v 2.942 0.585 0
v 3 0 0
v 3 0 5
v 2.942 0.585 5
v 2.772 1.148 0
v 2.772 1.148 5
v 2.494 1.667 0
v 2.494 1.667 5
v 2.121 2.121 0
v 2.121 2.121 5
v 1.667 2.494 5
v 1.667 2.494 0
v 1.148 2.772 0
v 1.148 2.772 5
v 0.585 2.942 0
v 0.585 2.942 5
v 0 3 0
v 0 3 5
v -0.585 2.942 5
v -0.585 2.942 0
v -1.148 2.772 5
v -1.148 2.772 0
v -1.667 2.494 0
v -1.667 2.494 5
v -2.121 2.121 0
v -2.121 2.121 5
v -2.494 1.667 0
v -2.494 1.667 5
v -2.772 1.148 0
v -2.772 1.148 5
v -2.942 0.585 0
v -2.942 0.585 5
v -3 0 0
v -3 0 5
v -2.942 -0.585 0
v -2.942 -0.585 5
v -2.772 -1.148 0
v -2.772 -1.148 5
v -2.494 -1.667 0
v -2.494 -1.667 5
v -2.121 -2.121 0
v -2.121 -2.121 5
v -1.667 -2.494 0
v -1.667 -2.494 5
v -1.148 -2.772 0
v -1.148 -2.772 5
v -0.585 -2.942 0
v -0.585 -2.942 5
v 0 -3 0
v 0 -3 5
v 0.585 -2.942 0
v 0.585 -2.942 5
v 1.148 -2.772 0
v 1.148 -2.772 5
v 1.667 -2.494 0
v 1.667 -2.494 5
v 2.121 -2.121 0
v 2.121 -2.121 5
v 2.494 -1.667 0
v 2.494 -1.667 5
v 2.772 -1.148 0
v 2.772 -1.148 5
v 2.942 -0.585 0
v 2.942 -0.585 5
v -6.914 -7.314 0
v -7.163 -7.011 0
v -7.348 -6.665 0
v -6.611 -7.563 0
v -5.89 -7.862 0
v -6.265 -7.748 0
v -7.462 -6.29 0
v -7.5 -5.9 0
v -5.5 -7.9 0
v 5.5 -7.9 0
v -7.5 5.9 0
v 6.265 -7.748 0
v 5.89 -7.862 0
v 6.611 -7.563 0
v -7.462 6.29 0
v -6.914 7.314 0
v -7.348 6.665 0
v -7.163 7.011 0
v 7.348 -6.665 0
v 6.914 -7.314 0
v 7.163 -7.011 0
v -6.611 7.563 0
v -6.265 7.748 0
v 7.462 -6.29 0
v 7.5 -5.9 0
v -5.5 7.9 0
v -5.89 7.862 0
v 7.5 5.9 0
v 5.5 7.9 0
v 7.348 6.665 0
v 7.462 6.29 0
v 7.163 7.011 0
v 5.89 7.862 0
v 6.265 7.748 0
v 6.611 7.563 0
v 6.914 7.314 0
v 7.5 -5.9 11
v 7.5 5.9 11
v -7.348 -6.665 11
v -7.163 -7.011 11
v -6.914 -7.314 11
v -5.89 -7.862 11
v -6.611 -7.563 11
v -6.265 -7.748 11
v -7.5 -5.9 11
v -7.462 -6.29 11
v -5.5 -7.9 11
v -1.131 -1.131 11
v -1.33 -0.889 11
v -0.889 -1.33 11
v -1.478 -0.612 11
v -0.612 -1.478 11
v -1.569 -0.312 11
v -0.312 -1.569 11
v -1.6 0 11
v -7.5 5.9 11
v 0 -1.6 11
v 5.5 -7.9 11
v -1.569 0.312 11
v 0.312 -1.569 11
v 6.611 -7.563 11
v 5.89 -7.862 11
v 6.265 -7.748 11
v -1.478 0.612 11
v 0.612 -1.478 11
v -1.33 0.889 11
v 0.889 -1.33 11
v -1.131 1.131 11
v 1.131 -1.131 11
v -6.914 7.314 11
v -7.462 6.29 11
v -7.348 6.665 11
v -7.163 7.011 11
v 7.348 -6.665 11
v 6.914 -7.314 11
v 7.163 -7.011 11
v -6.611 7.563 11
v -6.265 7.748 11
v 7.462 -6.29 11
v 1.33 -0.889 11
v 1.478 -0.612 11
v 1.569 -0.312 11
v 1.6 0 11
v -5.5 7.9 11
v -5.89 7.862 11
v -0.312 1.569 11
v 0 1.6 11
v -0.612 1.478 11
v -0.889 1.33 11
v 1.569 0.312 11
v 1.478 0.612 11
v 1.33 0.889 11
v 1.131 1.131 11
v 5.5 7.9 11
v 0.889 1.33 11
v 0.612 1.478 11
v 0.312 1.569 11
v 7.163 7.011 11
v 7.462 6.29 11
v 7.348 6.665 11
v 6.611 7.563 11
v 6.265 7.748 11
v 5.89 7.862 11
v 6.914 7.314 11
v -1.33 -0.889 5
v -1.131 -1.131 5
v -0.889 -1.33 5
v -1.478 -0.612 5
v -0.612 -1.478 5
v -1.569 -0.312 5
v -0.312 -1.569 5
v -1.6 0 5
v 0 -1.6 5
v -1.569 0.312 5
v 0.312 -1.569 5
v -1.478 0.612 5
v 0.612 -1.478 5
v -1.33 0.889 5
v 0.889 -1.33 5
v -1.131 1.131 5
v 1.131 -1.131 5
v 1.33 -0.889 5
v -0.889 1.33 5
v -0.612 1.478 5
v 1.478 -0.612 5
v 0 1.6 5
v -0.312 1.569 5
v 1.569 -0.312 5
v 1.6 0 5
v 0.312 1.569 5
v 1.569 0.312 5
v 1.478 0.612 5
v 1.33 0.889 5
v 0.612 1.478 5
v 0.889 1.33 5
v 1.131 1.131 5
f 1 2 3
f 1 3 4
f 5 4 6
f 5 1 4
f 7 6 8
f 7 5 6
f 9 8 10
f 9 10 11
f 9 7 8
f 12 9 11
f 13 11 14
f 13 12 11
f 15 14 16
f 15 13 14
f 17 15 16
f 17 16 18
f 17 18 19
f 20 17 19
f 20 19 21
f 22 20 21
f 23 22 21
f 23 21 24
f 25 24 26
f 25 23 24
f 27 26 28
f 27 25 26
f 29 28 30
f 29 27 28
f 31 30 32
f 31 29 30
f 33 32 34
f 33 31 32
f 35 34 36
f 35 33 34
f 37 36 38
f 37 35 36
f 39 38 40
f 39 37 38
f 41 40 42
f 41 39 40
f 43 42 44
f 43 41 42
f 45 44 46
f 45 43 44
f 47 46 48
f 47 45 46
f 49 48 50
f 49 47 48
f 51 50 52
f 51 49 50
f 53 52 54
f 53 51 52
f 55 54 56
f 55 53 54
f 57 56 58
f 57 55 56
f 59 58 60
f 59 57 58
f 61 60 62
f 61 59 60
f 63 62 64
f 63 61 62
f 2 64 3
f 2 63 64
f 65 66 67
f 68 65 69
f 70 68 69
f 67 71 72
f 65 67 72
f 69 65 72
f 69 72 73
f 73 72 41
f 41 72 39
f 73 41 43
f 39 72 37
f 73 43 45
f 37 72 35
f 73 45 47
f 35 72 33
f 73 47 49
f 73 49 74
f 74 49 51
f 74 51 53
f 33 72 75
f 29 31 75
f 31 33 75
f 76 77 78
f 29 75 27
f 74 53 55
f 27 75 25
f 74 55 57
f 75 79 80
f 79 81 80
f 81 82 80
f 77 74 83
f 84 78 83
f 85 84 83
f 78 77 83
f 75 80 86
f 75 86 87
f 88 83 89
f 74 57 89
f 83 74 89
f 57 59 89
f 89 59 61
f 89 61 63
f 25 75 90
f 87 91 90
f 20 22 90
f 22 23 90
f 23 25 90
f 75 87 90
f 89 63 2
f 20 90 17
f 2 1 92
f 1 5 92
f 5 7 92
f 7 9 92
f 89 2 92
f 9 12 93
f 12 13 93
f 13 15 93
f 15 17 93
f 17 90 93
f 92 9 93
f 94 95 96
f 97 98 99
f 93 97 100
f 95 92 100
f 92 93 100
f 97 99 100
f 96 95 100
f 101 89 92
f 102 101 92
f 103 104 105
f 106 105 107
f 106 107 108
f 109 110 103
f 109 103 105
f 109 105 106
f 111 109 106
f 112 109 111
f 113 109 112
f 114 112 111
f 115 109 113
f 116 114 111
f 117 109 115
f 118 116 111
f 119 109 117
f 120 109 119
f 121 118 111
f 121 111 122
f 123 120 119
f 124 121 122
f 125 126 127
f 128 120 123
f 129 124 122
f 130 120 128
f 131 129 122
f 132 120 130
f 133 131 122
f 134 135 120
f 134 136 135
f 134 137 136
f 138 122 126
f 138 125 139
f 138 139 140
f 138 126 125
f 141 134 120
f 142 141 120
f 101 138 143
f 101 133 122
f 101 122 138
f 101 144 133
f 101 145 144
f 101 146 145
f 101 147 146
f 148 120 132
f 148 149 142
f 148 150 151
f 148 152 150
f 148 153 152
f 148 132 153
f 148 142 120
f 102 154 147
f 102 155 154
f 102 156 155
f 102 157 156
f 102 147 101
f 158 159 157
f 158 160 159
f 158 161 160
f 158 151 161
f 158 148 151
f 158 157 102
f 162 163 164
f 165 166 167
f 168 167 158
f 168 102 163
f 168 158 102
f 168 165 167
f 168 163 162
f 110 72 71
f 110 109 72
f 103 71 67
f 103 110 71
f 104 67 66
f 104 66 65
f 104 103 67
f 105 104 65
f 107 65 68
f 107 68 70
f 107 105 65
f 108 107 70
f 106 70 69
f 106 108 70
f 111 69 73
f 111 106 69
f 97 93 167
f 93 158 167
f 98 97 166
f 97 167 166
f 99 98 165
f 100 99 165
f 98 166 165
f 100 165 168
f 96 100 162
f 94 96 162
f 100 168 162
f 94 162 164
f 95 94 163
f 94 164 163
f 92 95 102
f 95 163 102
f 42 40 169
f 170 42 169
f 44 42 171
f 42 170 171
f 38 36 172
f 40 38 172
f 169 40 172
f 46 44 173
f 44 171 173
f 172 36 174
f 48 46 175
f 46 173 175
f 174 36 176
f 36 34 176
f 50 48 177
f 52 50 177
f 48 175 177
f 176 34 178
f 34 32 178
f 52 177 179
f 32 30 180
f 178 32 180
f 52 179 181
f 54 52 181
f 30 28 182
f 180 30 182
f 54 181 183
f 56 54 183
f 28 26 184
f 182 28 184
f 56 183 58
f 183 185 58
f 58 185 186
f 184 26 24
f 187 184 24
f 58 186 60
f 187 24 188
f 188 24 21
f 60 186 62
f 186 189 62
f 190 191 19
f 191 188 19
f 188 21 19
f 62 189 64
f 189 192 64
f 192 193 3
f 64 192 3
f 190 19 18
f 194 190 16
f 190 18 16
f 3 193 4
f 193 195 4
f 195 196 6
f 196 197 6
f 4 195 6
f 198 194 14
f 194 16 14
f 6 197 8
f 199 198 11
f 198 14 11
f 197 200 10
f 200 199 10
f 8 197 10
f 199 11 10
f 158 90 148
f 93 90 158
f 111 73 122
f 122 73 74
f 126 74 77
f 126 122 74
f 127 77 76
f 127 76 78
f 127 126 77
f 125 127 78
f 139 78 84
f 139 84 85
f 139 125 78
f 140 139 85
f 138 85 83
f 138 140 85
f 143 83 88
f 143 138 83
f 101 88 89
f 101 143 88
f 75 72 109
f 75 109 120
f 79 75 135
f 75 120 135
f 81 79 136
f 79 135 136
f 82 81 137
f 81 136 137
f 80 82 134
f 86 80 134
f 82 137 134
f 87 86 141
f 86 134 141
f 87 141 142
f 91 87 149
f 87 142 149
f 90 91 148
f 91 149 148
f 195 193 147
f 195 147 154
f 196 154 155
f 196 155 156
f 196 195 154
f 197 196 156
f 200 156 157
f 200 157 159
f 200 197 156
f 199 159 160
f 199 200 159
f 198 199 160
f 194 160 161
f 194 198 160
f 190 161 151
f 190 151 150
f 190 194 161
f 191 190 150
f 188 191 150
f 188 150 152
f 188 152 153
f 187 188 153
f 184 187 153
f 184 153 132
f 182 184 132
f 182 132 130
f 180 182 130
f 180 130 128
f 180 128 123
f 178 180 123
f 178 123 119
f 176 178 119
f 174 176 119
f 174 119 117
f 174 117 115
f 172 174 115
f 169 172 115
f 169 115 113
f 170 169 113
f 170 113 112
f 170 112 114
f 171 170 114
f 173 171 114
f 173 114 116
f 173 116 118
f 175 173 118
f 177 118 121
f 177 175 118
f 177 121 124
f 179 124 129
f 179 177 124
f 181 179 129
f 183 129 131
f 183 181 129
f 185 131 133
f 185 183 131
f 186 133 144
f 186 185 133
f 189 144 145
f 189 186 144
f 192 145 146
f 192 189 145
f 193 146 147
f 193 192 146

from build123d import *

# Parameters (mm, degrees)
F0_W     = 15
F0_H     = 15.8
F0_R     = 3
F0_R_2   = 1.6
F1_DEPTH = 11
F2_DEPTH = 5
F3_R     = 2


with BuildPart() as f1:
    # F0 (on Top) → F1 (new body)
    with BuildSketch(Plane.XY):
        Rectangle(F0_W, F0_H)
        Circle(F0_R, mode=Mode.SUBTRACT)
        Circle(F0_R)
        Circle(F0_R_2, mode=Mode.SUBTRACT)
    extrude(amount=F1_DEPTH)

    # F0 (on Top) → F2 (cut)
    with BuildSketch(Plane.XY):
        Circle(F0_R)
        Circle(F0_R_2, mode=Mode.SUBTRACT)
    extrude(amount=F2_DEPTH, mode=Mode.SUBTRACT)

    # F3
    f3_edges = [f1.edges().sort_by_distance(p)[0] for p in [
        (-7.5, 7.9, 5.5),
        (-7.5, -7.9, 5.5),
        (7.5, -7.9, 5.5),
        (7.5, 7.9, 5.5),
    ]]
    fillet(f3_edges, radius=F3_R)


solid = f1.part
